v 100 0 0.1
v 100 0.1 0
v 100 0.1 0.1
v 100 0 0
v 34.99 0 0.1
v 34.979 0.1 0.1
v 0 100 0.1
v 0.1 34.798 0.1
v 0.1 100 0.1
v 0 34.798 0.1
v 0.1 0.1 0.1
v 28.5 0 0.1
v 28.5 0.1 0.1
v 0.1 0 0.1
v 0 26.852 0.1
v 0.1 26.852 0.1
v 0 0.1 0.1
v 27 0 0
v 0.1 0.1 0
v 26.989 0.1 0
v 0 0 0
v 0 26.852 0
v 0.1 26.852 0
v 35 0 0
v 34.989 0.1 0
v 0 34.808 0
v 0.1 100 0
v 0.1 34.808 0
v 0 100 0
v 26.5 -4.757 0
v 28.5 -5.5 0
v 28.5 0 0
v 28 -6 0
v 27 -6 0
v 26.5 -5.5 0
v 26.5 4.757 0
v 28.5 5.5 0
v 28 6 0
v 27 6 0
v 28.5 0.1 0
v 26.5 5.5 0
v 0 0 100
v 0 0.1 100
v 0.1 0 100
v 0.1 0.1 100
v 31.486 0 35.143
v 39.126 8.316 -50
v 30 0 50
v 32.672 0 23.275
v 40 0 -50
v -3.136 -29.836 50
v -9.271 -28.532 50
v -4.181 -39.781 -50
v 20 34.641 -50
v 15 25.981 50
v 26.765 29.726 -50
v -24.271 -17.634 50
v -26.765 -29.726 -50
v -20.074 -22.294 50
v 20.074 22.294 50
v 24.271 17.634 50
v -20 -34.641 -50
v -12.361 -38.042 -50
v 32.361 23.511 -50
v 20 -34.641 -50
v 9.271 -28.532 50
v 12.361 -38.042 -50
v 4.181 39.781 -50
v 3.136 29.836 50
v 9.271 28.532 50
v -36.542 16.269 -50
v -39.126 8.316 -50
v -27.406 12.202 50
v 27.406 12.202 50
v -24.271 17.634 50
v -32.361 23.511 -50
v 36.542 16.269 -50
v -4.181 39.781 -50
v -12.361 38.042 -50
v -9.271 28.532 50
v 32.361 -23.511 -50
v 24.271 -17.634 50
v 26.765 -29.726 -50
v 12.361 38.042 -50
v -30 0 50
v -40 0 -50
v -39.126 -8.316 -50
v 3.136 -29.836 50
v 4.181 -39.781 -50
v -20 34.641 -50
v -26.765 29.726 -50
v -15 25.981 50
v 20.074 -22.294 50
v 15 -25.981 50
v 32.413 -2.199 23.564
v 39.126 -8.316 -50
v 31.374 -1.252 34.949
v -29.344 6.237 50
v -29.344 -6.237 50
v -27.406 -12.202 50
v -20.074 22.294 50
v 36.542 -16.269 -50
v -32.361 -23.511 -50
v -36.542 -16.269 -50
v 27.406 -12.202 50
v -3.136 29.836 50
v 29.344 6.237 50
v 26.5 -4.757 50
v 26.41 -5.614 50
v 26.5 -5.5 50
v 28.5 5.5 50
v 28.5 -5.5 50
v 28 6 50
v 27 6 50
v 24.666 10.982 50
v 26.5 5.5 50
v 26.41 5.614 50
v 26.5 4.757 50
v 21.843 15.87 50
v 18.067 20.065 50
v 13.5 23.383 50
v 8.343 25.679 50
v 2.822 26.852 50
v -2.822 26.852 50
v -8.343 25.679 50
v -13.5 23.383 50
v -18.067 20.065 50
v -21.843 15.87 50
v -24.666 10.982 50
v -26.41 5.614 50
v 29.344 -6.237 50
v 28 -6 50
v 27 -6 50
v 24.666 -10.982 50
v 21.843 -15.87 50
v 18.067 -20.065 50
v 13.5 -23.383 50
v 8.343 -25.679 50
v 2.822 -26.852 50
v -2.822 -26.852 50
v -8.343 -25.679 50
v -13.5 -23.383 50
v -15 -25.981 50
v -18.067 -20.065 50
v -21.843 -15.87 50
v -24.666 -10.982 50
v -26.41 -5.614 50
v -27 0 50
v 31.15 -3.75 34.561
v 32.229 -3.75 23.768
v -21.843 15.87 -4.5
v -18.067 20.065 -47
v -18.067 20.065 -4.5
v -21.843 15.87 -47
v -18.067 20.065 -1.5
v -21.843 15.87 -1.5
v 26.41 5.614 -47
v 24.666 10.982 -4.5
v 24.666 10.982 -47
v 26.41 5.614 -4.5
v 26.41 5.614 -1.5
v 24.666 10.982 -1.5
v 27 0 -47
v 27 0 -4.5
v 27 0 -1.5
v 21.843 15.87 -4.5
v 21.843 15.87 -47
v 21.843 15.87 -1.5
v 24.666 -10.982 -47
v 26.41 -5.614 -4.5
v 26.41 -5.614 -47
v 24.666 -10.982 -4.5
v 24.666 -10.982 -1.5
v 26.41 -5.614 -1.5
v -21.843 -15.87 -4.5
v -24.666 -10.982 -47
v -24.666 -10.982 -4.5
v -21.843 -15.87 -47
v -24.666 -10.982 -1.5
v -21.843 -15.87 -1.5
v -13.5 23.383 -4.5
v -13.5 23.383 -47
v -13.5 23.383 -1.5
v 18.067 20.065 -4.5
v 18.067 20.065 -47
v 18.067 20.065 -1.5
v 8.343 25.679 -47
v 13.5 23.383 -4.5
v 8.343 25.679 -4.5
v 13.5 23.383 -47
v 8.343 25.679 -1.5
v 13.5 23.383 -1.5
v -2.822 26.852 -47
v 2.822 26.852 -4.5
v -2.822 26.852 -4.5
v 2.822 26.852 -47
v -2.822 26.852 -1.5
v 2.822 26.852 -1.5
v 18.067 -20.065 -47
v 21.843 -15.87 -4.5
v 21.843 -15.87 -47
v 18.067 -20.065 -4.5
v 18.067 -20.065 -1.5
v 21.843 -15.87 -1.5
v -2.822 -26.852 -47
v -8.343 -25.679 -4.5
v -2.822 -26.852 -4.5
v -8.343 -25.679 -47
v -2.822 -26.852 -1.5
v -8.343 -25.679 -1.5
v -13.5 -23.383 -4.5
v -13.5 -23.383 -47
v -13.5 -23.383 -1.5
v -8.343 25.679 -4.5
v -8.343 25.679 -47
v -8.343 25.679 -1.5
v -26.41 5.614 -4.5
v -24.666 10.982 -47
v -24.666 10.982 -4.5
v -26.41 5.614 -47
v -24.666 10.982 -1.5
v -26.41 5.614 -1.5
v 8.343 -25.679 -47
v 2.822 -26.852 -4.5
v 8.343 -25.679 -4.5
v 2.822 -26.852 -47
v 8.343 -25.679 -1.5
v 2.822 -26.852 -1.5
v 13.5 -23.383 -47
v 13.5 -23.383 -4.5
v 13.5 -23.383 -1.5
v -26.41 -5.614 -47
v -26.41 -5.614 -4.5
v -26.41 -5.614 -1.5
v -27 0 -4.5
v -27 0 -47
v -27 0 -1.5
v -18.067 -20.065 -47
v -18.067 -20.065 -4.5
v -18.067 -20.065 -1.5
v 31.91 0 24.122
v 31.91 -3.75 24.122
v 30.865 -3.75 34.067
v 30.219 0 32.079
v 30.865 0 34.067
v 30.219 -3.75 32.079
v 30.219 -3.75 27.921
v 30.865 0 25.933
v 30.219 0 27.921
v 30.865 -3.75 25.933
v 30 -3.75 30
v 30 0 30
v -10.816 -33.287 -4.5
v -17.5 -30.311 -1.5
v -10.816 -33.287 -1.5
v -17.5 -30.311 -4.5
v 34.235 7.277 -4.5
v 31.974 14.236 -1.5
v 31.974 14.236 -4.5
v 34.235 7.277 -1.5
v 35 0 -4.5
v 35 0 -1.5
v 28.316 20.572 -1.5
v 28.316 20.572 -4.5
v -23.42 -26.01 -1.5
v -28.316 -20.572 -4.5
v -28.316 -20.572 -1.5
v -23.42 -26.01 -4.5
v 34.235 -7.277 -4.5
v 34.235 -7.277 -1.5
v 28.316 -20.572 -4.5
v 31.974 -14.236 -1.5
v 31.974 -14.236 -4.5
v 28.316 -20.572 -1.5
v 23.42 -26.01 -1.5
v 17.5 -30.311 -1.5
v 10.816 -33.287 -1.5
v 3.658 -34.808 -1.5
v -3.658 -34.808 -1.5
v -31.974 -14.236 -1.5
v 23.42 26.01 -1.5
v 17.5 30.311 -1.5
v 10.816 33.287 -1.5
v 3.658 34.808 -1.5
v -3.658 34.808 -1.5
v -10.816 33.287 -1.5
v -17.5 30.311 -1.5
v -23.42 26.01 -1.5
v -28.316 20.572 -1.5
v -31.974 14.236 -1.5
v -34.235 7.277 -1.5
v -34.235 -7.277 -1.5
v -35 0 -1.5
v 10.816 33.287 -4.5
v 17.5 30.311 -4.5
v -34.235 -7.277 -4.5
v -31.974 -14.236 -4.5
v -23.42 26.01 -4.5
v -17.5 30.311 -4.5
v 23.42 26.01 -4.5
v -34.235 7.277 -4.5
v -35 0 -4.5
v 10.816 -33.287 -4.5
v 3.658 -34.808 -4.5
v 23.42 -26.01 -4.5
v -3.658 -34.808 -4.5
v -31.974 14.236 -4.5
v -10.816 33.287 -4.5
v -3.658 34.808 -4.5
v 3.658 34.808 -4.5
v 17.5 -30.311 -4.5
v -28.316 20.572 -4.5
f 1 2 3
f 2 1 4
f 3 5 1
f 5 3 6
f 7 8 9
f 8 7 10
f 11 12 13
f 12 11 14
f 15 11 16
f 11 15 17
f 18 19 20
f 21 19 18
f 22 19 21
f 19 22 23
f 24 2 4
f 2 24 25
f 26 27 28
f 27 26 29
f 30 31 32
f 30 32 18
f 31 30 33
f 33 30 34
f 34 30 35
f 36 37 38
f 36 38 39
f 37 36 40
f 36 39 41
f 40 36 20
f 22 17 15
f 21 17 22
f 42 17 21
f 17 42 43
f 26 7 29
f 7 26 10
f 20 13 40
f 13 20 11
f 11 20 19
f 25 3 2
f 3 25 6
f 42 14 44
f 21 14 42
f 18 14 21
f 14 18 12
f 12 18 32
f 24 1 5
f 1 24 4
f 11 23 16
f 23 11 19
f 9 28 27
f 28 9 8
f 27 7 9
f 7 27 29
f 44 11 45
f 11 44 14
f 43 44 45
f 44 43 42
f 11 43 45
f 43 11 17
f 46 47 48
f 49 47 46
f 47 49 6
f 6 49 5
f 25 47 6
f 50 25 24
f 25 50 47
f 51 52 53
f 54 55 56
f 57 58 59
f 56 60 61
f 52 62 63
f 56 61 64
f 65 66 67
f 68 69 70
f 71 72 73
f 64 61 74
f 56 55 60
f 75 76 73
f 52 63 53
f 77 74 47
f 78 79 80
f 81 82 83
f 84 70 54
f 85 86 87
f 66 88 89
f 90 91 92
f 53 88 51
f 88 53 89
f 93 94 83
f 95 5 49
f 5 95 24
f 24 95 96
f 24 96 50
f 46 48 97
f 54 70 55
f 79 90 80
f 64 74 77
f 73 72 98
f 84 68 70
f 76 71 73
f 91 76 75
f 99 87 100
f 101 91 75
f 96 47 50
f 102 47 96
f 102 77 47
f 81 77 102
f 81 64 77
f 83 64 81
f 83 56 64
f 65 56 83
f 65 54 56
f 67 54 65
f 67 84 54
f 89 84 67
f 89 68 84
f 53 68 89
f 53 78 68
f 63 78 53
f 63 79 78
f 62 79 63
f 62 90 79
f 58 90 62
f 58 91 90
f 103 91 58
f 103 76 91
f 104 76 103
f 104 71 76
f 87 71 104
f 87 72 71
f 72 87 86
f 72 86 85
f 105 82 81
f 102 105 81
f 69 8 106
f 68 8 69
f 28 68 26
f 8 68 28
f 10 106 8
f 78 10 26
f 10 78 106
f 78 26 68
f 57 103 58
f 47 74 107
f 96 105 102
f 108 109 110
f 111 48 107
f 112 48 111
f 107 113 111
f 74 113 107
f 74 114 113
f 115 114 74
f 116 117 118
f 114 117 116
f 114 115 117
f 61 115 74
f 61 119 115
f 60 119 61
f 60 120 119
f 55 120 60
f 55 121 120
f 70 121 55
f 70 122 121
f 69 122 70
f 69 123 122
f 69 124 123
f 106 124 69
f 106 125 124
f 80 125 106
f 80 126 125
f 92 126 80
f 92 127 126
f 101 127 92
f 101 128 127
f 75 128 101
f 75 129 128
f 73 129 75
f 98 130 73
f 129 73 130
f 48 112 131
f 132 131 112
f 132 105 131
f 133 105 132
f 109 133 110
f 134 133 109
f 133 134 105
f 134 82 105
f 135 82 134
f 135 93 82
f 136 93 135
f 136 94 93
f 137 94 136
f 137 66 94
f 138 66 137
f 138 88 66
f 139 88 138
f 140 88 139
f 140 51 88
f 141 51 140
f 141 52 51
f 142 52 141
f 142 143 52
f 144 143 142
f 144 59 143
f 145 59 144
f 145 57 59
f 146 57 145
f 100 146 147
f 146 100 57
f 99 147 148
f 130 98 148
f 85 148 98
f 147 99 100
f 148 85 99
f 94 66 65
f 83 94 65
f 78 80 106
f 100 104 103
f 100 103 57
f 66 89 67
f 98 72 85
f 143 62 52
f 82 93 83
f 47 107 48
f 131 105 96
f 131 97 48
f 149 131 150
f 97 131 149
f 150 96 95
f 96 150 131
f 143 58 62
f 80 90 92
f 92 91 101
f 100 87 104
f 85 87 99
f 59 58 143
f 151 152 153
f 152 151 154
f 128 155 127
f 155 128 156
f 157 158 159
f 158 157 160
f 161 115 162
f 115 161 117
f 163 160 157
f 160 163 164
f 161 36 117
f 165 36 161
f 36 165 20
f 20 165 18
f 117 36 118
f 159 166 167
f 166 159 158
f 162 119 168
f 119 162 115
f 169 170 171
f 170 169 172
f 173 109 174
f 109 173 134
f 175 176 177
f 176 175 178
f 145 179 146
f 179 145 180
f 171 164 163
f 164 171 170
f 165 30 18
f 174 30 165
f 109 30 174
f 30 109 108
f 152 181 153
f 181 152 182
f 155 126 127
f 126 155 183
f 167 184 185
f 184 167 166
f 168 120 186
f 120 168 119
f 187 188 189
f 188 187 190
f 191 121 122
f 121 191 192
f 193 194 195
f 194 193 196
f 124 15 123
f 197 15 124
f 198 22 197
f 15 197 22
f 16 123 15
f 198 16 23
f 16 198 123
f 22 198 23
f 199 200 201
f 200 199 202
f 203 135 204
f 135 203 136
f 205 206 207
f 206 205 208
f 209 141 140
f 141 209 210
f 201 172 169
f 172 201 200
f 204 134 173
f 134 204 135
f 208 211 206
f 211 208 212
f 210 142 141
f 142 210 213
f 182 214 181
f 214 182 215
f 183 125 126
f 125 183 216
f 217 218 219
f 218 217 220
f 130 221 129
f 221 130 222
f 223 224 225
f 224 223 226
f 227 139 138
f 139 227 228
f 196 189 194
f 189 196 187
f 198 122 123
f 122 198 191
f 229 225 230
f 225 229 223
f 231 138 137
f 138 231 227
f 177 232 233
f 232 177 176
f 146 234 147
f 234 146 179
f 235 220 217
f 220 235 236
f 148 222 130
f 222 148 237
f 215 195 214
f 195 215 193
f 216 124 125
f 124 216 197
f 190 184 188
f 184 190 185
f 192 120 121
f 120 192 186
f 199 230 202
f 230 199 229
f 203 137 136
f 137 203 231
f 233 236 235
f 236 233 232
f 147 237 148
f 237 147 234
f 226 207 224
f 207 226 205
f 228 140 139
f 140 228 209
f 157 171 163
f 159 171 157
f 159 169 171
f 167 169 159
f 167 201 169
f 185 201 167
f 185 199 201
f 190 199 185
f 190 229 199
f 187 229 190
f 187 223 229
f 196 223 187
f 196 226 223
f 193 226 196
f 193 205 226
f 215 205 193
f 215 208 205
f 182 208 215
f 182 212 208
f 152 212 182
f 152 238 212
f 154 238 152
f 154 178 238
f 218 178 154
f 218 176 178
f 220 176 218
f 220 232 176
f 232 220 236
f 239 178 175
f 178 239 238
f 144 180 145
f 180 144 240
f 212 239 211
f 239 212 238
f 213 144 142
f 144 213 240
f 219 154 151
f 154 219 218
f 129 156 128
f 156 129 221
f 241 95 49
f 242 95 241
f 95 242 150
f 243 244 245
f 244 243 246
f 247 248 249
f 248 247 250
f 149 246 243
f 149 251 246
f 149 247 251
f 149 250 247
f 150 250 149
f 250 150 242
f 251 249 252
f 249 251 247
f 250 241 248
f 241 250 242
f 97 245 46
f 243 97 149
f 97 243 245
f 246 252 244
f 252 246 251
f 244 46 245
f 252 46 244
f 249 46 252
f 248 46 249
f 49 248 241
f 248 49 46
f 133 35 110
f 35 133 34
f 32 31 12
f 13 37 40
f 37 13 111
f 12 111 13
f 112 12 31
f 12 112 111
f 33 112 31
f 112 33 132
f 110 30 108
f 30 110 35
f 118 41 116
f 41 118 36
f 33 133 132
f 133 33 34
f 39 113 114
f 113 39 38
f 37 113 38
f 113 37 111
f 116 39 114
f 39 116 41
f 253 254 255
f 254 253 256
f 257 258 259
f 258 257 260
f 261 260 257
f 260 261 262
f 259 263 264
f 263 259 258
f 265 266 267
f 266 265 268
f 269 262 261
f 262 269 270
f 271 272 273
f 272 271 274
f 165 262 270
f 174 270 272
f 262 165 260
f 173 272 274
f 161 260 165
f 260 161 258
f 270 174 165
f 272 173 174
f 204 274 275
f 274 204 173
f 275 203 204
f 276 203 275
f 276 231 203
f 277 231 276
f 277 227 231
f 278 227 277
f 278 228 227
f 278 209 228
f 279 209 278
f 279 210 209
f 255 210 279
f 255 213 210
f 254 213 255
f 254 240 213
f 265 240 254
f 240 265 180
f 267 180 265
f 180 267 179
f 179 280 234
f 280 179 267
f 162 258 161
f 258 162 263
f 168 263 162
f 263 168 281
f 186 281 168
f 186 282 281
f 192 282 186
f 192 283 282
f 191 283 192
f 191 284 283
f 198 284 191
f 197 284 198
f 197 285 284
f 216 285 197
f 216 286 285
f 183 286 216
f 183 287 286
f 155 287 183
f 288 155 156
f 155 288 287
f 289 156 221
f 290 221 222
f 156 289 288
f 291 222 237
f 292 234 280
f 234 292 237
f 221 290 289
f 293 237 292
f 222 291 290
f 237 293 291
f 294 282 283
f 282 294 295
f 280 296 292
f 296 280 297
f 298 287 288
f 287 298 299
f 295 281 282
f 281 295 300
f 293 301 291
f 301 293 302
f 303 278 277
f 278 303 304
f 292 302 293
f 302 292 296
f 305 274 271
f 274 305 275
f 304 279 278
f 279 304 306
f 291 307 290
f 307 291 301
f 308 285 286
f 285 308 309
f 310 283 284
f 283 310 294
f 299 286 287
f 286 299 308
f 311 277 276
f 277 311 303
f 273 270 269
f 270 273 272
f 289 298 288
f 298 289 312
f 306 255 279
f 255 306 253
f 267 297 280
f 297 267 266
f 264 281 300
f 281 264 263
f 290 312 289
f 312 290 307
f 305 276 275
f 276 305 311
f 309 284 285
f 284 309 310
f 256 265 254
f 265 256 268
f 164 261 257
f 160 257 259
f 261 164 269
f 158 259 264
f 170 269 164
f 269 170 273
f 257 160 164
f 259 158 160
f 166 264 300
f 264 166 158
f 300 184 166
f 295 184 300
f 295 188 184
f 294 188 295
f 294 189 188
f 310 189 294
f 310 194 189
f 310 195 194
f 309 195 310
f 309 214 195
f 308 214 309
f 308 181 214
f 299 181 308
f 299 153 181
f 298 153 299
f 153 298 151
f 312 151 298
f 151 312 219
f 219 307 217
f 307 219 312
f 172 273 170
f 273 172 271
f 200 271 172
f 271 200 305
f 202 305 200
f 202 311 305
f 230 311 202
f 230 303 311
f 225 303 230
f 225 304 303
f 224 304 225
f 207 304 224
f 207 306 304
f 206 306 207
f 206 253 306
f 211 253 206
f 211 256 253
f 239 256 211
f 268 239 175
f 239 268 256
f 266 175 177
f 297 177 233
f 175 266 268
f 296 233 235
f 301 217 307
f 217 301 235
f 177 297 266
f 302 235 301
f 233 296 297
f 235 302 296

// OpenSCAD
    // Combined Scene

    // Permanent Model
    
    // Permanent Model (Black)
    color([0, 0, 0]) {
        // Your permanent model code here
        cube([100,0.1,0.1], center = false);
        cube([0.1,100,0.1], center = false);
        cube([0.1,0.1,100], center = false);
    }
    

    // Dynamic Model
    difference() {
    // Main mug body
    difference() {
        // Outer shape with a wider top and narrower bottom
        cylinder(h=100, r1=40, r2=30, center=true);
        // Inner hollow space for fluid containment with 3 mm wall thickness
        translate([0, 0, 2])
            cylinder(h=98, r=27, center=true);
    }

    // Handle of the mug
    translate([40, 0, 30])
        rotate([90, 0, 0])
            difference() {
                // Outer part of handle
                scale([1, 1, 0.5])
                    cylinder(h=15, r=10, center=true);
                
                // Inner cutout of handle
                translate([-6, 0, -5])
                    scale([1, 1, 0.5])
                        cylinder(h=20, r=7, center=true);
            }

    // Rounded base for stability
    translate([0, 0, -3])
        cylinder(h=3, r=35, center=true);

    // Slightly flared rim for comfort
    translate([0, 0, 100])
        cylinder(h=5, r=40, center=true);
    translate([0, 0, 95])
        cylinder(h=5, r=32, center=true);
    
    // Texturing for grip (optional pattern)
    for (i = [-1:1:1]) {
        translate([0, i * 1.5, 0])
            linear_extrude(height=100)
                offset(r=0.5)
                    polygon(points=[[27,-4], [27,4], [28,4], [28,-4]]);
    }
}
    
